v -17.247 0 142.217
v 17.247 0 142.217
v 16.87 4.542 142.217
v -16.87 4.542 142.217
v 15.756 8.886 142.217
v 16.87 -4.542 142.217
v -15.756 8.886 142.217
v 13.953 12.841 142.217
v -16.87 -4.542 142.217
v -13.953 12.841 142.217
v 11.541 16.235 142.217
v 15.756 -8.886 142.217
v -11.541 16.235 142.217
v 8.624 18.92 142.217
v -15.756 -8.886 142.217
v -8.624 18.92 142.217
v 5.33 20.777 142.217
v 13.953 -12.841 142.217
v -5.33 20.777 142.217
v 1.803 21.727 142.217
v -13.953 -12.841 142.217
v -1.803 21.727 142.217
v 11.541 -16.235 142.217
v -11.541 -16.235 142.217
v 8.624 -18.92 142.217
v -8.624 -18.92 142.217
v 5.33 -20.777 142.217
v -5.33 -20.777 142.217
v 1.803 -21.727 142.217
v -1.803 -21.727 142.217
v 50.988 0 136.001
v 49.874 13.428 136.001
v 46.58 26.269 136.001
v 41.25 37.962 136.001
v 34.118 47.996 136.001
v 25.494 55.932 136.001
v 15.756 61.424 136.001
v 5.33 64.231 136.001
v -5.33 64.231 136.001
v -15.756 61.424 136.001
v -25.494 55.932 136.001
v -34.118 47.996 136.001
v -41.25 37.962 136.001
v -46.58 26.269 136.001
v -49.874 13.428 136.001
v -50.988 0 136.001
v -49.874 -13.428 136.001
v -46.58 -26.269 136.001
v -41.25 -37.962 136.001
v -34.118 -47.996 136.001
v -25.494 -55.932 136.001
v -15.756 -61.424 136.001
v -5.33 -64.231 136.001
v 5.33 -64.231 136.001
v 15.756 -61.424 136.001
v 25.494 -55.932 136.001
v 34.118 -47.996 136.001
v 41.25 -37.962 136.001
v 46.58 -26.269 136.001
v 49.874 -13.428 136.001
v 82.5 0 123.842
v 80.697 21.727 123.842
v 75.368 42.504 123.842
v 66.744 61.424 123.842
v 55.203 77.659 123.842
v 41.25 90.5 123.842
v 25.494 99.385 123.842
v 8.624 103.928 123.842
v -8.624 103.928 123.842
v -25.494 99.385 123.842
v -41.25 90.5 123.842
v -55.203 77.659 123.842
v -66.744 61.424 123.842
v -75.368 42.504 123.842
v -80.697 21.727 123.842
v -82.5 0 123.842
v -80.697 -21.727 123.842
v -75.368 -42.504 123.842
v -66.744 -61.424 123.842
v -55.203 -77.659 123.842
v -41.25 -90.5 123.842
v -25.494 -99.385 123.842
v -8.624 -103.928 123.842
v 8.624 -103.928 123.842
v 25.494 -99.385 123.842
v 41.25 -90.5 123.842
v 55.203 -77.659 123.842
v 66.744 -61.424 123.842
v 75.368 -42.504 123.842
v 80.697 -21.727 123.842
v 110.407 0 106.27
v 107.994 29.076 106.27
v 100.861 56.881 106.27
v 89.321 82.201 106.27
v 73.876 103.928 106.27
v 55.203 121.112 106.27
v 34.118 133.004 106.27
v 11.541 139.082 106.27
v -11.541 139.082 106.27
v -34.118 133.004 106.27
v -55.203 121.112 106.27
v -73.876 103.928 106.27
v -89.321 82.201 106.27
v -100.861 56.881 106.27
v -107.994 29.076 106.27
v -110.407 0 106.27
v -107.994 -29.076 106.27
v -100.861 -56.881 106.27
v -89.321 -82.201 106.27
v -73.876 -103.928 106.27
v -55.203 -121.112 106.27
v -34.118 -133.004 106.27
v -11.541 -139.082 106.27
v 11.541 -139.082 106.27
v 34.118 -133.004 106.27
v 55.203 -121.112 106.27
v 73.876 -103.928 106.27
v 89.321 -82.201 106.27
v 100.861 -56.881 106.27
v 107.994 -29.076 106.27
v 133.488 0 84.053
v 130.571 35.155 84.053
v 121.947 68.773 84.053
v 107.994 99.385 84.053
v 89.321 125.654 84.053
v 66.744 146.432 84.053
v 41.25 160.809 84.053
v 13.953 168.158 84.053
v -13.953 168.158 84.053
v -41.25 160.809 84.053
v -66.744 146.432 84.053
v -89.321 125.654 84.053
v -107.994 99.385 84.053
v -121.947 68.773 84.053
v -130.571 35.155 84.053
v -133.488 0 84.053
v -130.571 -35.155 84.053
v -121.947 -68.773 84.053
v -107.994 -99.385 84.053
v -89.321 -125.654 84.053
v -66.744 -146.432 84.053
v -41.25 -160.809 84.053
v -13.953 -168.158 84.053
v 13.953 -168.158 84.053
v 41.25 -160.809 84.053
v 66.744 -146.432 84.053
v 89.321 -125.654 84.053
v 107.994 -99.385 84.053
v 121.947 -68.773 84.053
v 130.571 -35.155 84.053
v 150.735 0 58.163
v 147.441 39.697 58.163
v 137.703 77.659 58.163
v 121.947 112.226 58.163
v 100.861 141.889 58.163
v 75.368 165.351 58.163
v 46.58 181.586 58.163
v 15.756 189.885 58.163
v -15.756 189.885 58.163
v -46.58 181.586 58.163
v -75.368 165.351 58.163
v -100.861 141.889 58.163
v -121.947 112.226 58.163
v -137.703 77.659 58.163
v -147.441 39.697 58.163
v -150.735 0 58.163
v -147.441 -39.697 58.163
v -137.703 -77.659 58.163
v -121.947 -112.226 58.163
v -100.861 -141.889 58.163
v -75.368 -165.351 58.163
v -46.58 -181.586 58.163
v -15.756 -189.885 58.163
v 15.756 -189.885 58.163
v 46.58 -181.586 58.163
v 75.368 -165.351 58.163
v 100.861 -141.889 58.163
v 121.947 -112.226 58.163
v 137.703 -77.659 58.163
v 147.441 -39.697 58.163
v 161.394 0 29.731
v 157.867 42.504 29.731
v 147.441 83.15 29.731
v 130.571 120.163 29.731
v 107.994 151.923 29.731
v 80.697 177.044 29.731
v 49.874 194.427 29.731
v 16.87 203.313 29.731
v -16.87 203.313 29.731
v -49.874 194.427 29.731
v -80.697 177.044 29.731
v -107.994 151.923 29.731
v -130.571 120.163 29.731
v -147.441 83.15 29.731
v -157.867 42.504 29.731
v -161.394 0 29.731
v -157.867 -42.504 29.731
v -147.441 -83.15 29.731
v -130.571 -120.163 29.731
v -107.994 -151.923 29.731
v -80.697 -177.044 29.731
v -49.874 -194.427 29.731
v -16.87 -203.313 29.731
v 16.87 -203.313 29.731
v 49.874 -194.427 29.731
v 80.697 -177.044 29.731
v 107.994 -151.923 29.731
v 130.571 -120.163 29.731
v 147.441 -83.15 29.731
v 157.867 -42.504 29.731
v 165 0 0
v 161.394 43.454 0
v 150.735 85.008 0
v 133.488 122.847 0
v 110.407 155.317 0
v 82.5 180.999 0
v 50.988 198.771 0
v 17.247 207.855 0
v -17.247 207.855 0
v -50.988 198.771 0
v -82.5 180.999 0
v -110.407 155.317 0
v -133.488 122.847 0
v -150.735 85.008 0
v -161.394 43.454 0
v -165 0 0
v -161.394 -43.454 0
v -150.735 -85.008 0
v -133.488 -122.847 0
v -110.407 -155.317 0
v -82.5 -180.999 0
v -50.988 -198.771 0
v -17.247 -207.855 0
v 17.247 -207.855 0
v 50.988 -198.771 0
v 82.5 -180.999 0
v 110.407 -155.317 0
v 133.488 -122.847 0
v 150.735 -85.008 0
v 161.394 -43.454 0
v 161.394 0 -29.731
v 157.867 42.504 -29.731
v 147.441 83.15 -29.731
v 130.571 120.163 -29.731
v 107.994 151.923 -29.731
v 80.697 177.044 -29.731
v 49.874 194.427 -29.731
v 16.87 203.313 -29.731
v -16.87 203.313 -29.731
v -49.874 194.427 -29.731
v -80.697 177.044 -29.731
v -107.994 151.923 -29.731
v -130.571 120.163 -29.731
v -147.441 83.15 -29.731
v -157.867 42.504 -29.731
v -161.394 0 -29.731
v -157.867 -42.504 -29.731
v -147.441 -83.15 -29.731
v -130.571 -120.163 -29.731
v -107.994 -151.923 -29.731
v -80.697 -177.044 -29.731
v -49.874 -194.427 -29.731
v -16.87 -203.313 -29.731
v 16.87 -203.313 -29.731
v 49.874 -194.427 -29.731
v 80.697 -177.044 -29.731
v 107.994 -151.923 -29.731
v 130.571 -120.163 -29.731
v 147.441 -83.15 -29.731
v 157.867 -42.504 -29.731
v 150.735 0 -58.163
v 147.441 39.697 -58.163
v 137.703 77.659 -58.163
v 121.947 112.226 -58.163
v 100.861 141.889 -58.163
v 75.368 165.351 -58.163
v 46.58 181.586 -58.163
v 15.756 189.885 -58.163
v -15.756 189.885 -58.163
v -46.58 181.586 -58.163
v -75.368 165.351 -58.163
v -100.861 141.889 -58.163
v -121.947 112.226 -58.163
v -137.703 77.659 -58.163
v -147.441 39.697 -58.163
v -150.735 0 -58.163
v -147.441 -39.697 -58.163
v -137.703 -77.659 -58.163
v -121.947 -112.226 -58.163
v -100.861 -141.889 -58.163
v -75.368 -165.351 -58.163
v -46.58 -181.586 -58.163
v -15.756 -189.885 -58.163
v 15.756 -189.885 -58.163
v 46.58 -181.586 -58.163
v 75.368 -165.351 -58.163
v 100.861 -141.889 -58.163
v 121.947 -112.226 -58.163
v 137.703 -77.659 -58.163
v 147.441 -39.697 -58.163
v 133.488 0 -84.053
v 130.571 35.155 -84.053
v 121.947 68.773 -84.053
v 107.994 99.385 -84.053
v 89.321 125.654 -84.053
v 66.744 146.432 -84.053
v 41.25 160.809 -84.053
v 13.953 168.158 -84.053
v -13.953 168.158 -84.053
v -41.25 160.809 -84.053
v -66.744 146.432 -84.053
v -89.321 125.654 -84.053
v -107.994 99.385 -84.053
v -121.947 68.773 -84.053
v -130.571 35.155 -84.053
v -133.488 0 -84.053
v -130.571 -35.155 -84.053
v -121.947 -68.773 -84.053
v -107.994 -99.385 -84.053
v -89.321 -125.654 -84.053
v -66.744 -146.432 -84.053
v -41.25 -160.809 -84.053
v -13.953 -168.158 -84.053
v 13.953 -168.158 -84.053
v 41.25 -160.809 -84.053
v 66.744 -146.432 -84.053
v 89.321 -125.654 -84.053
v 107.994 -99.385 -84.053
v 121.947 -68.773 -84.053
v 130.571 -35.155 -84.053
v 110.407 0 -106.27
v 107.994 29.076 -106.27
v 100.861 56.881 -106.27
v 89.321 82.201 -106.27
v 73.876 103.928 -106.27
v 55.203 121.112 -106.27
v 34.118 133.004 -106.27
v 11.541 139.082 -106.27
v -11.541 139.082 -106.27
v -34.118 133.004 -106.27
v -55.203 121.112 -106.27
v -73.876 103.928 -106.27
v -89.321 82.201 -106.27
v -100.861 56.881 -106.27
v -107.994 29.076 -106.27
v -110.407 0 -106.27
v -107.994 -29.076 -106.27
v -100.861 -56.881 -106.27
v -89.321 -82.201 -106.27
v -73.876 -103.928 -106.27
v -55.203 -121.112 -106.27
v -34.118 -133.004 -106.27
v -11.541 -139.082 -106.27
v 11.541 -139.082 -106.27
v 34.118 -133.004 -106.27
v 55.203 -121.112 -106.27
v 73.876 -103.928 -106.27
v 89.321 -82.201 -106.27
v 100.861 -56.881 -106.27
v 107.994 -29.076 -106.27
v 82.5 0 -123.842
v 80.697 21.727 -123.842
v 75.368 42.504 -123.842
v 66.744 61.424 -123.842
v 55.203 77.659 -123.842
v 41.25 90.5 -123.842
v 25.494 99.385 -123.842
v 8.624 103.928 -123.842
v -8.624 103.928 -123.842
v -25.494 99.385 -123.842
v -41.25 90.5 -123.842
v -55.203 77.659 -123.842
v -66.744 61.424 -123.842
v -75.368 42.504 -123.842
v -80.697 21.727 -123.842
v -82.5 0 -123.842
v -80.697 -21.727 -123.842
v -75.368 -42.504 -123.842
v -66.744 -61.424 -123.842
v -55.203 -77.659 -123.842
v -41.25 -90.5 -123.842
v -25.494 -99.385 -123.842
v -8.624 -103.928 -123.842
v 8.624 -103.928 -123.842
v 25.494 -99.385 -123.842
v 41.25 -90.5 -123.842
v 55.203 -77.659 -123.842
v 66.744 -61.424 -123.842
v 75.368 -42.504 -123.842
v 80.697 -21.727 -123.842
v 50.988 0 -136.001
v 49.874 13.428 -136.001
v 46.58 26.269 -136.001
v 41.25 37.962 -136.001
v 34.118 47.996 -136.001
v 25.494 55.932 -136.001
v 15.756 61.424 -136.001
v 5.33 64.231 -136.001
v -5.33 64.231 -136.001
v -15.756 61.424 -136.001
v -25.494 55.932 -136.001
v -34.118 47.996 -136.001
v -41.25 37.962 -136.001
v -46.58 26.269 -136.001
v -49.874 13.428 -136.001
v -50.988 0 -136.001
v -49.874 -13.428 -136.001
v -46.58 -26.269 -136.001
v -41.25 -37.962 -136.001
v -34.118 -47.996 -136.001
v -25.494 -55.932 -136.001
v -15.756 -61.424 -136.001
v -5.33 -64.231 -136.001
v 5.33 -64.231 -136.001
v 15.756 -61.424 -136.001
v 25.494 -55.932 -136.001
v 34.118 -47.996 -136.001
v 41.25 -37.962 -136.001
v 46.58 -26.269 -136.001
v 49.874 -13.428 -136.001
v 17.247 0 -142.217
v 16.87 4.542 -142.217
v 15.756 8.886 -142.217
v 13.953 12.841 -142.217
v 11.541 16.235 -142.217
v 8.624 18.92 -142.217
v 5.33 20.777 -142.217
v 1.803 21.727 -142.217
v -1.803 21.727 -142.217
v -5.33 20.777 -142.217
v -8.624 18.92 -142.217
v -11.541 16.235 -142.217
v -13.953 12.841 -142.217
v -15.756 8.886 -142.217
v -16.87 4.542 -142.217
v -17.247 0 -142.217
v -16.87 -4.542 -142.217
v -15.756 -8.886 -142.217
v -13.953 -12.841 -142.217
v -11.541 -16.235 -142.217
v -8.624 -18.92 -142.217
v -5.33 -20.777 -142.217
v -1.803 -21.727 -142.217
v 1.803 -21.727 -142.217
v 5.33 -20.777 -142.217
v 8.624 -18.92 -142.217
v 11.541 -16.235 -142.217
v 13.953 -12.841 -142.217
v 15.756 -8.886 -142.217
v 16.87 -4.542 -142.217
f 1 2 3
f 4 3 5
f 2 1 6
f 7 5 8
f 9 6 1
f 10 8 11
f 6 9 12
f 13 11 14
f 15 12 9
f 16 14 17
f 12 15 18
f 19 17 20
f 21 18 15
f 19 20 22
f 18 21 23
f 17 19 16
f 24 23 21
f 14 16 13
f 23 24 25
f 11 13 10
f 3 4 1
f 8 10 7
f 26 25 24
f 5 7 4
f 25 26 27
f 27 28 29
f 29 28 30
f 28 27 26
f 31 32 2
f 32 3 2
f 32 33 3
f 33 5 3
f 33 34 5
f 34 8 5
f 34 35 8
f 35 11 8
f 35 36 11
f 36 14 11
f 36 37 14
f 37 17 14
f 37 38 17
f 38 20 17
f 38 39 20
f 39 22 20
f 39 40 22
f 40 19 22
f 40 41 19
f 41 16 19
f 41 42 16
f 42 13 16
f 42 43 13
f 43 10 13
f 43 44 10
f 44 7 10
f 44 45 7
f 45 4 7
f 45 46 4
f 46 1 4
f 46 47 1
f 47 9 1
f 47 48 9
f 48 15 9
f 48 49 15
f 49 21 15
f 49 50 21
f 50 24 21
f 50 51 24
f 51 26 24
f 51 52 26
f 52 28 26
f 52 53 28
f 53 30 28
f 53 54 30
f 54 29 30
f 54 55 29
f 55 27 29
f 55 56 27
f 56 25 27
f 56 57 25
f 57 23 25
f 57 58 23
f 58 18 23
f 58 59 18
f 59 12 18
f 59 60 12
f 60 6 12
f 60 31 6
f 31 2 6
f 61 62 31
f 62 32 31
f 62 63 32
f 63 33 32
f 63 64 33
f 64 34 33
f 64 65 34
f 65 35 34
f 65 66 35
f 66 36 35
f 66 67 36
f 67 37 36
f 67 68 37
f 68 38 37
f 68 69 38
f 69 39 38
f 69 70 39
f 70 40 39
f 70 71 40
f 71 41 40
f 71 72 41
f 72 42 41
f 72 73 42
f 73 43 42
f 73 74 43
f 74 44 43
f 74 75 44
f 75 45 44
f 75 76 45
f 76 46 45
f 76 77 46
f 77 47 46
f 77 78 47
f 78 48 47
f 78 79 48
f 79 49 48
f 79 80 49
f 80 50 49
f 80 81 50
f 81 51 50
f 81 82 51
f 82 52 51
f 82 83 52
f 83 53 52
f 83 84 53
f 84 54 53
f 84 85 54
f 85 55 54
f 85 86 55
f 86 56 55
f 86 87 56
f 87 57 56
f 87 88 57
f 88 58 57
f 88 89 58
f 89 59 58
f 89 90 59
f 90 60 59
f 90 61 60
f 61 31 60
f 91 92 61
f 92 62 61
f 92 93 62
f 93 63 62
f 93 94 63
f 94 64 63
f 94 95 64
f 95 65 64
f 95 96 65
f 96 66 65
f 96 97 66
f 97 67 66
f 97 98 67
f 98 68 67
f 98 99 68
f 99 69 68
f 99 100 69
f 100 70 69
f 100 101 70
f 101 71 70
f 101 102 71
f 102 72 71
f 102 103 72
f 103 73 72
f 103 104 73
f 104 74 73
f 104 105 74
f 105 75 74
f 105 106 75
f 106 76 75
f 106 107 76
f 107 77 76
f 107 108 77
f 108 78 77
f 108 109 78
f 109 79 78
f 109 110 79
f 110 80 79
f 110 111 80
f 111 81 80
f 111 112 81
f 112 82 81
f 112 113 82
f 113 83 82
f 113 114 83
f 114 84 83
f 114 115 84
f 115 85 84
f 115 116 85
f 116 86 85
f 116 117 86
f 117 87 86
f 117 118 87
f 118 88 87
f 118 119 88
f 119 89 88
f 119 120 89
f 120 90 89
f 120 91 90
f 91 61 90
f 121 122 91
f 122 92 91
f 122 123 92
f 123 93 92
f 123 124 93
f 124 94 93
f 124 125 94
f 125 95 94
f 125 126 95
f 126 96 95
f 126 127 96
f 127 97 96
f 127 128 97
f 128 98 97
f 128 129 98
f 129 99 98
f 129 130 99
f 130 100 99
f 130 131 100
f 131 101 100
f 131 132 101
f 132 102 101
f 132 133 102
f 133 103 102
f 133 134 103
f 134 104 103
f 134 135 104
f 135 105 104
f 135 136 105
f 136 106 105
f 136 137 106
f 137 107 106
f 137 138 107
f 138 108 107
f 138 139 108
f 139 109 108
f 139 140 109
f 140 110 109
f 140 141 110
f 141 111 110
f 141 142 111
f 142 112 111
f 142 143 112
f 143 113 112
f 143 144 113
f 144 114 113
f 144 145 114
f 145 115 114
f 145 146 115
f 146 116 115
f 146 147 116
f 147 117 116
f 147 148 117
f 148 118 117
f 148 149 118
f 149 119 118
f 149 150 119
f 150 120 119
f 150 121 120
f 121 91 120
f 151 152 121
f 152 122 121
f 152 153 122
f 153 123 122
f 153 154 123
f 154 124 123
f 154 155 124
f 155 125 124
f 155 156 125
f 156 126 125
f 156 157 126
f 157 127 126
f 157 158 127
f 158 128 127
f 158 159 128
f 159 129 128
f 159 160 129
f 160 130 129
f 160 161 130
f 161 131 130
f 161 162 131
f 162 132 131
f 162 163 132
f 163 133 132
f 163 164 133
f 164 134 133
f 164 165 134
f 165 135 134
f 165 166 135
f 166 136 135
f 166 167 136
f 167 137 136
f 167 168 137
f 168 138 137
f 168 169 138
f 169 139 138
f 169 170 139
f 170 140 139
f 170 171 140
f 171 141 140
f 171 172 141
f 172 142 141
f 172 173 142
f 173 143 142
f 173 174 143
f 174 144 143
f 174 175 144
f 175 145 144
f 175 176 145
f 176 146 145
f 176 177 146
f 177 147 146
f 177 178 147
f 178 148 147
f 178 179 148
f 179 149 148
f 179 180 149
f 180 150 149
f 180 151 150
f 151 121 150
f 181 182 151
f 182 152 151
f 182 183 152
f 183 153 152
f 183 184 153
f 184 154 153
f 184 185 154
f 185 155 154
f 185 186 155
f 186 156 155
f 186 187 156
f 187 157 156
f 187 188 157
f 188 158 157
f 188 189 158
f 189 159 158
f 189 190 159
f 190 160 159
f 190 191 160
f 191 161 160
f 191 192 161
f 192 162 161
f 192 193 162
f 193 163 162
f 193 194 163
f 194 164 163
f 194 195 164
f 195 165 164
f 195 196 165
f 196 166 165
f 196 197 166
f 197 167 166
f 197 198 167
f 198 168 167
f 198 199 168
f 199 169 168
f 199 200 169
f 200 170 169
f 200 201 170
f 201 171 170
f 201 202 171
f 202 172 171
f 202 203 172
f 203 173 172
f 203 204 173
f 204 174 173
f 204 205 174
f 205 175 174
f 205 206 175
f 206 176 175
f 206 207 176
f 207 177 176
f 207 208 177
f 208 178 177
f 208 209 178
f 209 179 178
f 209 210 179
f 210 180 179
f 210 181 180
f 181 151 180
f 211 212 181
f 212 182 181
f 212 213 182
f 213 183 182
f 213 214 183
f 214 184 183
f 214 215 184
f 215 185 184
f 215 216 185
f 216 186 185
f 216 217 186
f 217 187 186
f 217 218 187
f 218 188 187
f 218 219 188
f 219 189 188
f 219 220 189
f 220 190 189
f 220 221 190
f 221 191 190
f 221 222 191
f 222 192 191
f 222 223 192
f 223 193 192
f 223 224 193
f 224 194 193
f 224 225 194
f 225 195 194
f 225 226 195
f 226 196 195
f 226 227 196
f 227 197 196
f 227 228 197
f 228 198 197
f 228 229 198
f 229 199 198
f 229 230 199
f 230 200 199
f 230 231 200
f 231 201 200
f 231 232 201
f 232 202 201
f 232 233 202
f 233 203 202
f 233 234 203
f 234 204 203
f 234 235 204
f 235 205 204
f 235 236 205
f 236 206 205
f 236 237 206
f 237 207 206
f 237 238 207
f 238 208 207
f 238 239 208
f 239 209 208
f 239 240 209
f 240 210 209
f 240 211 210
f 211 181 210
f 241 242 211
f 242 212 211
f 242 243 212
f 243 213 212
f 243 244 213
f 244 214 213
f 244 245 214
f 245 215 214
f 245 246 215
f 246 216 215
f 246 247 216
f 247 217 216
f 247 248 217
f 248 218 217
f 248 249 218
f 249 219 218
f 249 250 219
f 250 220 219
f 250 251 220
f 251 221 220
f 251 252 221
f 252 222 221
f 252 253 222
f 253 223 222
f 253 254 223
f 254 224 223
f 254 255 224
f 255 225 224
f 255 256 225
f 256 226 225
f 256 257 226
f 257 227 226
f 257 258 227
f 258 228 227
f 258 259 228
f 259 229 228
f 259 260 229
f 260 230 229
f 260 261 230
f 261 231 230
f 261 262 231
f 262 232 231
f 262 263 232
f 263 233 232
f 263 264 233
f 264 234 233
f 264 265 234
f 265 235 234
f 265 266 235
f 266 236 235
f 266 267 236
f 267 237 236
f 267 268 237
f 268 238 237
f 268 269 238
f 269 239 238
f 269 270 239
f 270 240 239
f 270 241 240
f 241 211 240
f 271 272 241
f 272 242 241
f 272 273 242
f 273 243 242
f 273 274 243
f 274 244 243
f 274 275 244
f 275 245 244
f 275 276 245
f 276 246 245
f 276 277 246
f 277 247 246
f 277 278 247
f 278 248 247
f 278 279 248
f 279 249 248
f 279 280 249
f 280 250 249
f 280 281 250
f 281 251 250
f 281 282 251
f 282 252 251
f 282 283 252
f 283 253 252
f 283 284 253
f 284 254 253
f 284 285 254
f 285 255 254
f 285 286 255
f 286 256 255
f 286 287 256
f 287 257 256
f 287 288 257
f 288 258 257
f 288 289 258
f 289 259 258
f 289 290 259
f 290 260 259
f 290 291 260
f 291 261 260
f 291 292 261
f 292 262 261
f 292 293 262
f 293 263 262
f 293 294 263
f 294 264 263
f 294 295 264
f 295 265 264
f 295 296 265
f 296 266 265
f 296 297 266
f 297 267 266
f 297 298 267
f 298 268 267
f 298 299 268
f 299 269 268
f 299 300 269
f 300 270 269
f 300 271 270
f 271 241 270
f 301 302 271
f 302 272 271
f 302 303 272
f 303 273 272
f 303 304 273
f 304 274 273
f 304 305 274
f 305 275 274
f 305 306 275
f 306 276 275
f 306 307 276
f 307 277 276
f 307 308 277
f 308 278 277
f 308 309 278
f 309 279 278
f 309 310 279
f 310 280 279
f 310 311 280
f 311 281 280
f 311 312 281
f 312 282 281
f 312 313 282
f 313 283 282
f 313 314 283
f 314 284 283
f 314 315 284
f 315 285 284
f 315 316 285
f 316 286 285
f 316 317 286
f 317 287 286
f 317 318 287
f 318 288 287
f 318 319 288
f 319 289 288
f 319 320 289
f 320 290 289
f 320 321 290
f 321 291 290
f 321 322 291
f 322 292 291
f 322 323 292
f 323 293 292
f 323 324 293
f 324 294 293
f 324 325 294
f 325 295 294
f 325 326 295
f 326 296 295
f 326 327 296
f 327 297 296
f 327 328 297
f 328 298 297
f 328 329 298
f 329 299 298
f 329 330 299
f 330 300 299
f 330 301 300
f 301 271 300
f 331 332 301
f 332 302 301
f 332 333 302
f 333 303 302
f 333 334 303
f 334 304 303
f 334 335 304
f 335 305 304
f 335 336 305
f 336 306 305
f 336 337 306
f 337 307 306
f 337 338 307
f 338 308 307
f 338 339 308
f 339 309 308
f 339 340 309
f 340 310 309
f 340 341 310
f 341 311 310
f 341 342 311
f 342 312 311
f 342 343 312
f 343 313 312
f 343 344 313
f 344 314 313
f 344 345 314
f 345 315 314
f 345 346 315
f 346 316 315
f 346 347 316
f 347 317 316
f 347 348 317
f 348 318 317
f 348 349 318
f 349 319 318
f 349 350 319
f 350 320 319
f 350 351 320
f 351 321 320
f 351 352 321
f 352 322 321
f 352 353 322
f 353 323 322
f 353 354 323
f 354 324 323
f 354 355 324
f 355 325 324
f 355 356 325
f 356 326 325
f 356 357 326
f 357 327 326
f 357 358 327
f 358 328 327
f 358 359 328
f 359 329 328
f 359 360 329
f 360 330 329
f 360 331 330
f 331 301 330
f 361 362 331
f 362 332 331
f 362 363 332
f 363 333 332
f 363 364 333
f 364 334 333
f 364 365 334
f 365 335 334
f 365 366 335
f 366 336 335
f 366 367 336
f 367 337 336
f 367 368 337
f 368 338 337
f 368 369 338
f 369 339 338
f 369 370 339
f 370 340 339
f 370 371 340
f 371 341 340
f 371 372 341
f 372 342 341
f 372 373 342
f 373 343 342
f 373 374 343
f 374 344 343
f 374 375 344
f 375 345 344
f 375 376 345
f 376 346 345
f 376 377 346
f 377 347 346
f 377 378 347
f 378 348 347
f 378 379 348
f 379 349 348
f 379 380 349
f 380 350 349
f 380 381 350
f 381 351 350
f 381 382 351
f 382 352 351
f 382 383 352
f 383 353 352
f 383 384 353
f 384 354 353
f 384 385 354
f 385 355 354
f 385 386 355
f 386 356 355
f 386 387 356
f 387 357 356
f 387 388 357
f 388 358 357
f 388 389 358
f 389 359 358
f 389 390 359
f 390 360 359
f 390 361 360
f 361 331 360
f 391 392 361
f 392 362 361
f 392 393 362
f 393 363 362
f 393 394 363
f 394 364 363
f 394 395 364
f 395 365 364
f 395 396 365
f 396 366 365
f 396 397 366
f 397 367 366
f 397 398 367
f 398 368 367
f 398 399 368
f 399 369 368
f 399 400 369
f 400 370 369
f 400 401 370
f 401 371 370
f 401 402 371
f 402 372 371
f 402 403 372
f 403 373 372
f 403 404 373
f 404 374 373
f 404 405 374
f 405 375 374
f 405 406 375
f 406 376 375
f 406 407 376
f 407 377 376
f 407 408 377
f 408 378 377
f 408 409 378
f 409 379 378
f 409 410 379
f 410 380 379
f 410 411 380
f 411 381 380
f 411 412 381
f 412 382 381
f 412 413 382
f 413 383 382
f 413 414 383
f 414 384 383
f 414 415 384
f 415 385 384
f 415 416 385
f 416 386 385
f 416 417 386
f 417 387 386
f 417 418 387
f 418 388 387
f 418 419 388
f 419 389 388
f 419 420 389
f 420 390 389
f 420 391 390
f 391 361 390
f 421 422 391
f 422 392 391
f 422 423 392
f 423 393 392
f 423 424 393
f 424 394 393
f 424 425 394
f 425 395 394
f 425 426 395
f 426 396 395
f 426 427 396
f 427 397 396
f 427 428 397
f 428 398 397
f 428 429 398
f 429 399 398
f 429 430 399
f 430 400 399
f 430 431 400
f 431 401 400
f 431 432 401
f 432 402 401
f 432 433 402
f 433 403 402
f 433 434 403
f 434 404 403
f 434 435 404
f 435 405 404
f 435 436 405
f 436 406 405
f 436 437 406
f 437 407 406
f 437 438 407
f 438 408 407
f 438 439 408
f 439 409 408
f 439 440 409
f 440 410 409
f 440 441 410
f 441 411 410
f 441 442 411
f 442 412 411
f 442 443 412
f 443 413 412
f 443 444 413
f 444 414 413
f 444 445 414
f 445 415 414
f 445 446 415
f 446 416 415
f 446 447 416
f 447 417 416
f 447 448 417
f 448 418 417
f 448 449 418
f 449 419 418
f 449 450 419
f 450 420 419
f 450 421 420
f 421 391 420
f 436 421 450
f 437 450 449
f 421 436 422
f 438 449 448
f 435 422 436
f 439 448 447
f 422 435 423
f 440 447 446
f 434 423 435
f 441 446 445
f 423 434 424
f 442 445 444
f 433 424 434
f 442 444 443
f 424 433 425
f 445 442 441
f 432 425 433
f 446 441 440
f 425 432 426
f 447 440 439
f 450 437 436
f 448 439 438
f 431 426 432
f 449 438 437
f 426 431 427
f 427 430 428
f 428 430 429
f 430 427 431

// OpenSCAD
// Generated by SolidPython 1.0.1 on 2020-07-29 00:46:52


scale(v = [15, 19, 13]) {
	sphere(r = 11);
}
/***********************************************
*********      SolidPython code:      **********
************************************************
 
# import packages: SolidPython
from solid import *
from solid.utils import *
from itertools import chain, combinations, permutations


class Resize:

    def __init__(self, scad_file):
        self.scad_file = scad_file
        #self.scad_file = import_scad(scad_file)
        # cone/cylinder param:
        self.r1 = 0
        self.r2 = 0
        self.h = 0
        # rectangular prism param:
        self.w = 0
        self.l = 0
        # ellipse param:
        self.r = 0

    # import OpenScad code (file name corresponds to shape)


    # classify shape + parameters
    def assign(self, param1, param2, param3):
        if self.scad_file == 'cone.scad':
            self.r1 = param1
            self.r2 = param2
            self.h = param3
        elif self.scad_file == 'cylinder.scad':
            self.r1 = param1
            self.r2 = param2
            self.h = param3
        elif self.scad_file == 'rectangularPrism.scad':
            self.h = param1
            self.l = param2
            self.w = param3
        else:
            self.r = param1
            self.h = param2

    # resize parameters
    def iterate(self):
        x = range(3, 20, 2)
        i = 1
        if self.scad_file == 'cone.scad':
            tempList = list(permutations(x, 2))
            for temp in tempList:
                param1 = temp[0]
                param2 = temp[1]
                filepath = 'produced_scad_files/' + 'cone' + str(param1) + '_' + str(param2) + '_' + '.scad'
                scad_render_to_file(cylinder(h=param1, r1=param2, r2=0), filepath)

        elif self.scad_file == 'cylinder.scad':
            tempList = list(permutations(x, 3))
            for temp in tempList:
                param1 = temp[0]
                param2 = temp[1]
                filepath = 'produced_scad_files/' + 'cylinder' + str(param1) + '_' + str(param2) + '_' + '.scad'
                scad_render_to_file(cylinder(h=param1, r1=param2, r2=param2), filepath)

        elif self.scad_file == 'rectangularPrism.scad':
            tempList = list(permutations(x, 3))
            for temp in tempList:
                param1 = temp[0]
                param2 = temp[1]
                param3 = temp[2]
                filepath = 'produced_scad_files/' + 'rectangularPrism' + str(param1) + '_' + str(param2) + '_' + str(
                    param3) + '.scad'
                scad_render_to_file(cube(size=(param1, param2, param3)), filepath)

        elif self.scad_file == 'ellipse.scad':
            tempList = list(permutations(x, 4))
            for temp in tempList:
                param1 = temp[0]
                param2 = temp[1]
                param3 = temp[2]
                param4 = temp[3]
                filepath = 'produced_scad_files/' + 'ellipse' + str(param1) + '_' + str(param2) + '_' + str(param3) + '_' + str(param4) + '.scad'
                scad_render_to_file(scale([param1, param2, param3])(sphere(r=param4)), filepath)

    def render_to_scadfile(self):
        scad_render_to_file(scad, 'example.scad') 
 
************************************************/
